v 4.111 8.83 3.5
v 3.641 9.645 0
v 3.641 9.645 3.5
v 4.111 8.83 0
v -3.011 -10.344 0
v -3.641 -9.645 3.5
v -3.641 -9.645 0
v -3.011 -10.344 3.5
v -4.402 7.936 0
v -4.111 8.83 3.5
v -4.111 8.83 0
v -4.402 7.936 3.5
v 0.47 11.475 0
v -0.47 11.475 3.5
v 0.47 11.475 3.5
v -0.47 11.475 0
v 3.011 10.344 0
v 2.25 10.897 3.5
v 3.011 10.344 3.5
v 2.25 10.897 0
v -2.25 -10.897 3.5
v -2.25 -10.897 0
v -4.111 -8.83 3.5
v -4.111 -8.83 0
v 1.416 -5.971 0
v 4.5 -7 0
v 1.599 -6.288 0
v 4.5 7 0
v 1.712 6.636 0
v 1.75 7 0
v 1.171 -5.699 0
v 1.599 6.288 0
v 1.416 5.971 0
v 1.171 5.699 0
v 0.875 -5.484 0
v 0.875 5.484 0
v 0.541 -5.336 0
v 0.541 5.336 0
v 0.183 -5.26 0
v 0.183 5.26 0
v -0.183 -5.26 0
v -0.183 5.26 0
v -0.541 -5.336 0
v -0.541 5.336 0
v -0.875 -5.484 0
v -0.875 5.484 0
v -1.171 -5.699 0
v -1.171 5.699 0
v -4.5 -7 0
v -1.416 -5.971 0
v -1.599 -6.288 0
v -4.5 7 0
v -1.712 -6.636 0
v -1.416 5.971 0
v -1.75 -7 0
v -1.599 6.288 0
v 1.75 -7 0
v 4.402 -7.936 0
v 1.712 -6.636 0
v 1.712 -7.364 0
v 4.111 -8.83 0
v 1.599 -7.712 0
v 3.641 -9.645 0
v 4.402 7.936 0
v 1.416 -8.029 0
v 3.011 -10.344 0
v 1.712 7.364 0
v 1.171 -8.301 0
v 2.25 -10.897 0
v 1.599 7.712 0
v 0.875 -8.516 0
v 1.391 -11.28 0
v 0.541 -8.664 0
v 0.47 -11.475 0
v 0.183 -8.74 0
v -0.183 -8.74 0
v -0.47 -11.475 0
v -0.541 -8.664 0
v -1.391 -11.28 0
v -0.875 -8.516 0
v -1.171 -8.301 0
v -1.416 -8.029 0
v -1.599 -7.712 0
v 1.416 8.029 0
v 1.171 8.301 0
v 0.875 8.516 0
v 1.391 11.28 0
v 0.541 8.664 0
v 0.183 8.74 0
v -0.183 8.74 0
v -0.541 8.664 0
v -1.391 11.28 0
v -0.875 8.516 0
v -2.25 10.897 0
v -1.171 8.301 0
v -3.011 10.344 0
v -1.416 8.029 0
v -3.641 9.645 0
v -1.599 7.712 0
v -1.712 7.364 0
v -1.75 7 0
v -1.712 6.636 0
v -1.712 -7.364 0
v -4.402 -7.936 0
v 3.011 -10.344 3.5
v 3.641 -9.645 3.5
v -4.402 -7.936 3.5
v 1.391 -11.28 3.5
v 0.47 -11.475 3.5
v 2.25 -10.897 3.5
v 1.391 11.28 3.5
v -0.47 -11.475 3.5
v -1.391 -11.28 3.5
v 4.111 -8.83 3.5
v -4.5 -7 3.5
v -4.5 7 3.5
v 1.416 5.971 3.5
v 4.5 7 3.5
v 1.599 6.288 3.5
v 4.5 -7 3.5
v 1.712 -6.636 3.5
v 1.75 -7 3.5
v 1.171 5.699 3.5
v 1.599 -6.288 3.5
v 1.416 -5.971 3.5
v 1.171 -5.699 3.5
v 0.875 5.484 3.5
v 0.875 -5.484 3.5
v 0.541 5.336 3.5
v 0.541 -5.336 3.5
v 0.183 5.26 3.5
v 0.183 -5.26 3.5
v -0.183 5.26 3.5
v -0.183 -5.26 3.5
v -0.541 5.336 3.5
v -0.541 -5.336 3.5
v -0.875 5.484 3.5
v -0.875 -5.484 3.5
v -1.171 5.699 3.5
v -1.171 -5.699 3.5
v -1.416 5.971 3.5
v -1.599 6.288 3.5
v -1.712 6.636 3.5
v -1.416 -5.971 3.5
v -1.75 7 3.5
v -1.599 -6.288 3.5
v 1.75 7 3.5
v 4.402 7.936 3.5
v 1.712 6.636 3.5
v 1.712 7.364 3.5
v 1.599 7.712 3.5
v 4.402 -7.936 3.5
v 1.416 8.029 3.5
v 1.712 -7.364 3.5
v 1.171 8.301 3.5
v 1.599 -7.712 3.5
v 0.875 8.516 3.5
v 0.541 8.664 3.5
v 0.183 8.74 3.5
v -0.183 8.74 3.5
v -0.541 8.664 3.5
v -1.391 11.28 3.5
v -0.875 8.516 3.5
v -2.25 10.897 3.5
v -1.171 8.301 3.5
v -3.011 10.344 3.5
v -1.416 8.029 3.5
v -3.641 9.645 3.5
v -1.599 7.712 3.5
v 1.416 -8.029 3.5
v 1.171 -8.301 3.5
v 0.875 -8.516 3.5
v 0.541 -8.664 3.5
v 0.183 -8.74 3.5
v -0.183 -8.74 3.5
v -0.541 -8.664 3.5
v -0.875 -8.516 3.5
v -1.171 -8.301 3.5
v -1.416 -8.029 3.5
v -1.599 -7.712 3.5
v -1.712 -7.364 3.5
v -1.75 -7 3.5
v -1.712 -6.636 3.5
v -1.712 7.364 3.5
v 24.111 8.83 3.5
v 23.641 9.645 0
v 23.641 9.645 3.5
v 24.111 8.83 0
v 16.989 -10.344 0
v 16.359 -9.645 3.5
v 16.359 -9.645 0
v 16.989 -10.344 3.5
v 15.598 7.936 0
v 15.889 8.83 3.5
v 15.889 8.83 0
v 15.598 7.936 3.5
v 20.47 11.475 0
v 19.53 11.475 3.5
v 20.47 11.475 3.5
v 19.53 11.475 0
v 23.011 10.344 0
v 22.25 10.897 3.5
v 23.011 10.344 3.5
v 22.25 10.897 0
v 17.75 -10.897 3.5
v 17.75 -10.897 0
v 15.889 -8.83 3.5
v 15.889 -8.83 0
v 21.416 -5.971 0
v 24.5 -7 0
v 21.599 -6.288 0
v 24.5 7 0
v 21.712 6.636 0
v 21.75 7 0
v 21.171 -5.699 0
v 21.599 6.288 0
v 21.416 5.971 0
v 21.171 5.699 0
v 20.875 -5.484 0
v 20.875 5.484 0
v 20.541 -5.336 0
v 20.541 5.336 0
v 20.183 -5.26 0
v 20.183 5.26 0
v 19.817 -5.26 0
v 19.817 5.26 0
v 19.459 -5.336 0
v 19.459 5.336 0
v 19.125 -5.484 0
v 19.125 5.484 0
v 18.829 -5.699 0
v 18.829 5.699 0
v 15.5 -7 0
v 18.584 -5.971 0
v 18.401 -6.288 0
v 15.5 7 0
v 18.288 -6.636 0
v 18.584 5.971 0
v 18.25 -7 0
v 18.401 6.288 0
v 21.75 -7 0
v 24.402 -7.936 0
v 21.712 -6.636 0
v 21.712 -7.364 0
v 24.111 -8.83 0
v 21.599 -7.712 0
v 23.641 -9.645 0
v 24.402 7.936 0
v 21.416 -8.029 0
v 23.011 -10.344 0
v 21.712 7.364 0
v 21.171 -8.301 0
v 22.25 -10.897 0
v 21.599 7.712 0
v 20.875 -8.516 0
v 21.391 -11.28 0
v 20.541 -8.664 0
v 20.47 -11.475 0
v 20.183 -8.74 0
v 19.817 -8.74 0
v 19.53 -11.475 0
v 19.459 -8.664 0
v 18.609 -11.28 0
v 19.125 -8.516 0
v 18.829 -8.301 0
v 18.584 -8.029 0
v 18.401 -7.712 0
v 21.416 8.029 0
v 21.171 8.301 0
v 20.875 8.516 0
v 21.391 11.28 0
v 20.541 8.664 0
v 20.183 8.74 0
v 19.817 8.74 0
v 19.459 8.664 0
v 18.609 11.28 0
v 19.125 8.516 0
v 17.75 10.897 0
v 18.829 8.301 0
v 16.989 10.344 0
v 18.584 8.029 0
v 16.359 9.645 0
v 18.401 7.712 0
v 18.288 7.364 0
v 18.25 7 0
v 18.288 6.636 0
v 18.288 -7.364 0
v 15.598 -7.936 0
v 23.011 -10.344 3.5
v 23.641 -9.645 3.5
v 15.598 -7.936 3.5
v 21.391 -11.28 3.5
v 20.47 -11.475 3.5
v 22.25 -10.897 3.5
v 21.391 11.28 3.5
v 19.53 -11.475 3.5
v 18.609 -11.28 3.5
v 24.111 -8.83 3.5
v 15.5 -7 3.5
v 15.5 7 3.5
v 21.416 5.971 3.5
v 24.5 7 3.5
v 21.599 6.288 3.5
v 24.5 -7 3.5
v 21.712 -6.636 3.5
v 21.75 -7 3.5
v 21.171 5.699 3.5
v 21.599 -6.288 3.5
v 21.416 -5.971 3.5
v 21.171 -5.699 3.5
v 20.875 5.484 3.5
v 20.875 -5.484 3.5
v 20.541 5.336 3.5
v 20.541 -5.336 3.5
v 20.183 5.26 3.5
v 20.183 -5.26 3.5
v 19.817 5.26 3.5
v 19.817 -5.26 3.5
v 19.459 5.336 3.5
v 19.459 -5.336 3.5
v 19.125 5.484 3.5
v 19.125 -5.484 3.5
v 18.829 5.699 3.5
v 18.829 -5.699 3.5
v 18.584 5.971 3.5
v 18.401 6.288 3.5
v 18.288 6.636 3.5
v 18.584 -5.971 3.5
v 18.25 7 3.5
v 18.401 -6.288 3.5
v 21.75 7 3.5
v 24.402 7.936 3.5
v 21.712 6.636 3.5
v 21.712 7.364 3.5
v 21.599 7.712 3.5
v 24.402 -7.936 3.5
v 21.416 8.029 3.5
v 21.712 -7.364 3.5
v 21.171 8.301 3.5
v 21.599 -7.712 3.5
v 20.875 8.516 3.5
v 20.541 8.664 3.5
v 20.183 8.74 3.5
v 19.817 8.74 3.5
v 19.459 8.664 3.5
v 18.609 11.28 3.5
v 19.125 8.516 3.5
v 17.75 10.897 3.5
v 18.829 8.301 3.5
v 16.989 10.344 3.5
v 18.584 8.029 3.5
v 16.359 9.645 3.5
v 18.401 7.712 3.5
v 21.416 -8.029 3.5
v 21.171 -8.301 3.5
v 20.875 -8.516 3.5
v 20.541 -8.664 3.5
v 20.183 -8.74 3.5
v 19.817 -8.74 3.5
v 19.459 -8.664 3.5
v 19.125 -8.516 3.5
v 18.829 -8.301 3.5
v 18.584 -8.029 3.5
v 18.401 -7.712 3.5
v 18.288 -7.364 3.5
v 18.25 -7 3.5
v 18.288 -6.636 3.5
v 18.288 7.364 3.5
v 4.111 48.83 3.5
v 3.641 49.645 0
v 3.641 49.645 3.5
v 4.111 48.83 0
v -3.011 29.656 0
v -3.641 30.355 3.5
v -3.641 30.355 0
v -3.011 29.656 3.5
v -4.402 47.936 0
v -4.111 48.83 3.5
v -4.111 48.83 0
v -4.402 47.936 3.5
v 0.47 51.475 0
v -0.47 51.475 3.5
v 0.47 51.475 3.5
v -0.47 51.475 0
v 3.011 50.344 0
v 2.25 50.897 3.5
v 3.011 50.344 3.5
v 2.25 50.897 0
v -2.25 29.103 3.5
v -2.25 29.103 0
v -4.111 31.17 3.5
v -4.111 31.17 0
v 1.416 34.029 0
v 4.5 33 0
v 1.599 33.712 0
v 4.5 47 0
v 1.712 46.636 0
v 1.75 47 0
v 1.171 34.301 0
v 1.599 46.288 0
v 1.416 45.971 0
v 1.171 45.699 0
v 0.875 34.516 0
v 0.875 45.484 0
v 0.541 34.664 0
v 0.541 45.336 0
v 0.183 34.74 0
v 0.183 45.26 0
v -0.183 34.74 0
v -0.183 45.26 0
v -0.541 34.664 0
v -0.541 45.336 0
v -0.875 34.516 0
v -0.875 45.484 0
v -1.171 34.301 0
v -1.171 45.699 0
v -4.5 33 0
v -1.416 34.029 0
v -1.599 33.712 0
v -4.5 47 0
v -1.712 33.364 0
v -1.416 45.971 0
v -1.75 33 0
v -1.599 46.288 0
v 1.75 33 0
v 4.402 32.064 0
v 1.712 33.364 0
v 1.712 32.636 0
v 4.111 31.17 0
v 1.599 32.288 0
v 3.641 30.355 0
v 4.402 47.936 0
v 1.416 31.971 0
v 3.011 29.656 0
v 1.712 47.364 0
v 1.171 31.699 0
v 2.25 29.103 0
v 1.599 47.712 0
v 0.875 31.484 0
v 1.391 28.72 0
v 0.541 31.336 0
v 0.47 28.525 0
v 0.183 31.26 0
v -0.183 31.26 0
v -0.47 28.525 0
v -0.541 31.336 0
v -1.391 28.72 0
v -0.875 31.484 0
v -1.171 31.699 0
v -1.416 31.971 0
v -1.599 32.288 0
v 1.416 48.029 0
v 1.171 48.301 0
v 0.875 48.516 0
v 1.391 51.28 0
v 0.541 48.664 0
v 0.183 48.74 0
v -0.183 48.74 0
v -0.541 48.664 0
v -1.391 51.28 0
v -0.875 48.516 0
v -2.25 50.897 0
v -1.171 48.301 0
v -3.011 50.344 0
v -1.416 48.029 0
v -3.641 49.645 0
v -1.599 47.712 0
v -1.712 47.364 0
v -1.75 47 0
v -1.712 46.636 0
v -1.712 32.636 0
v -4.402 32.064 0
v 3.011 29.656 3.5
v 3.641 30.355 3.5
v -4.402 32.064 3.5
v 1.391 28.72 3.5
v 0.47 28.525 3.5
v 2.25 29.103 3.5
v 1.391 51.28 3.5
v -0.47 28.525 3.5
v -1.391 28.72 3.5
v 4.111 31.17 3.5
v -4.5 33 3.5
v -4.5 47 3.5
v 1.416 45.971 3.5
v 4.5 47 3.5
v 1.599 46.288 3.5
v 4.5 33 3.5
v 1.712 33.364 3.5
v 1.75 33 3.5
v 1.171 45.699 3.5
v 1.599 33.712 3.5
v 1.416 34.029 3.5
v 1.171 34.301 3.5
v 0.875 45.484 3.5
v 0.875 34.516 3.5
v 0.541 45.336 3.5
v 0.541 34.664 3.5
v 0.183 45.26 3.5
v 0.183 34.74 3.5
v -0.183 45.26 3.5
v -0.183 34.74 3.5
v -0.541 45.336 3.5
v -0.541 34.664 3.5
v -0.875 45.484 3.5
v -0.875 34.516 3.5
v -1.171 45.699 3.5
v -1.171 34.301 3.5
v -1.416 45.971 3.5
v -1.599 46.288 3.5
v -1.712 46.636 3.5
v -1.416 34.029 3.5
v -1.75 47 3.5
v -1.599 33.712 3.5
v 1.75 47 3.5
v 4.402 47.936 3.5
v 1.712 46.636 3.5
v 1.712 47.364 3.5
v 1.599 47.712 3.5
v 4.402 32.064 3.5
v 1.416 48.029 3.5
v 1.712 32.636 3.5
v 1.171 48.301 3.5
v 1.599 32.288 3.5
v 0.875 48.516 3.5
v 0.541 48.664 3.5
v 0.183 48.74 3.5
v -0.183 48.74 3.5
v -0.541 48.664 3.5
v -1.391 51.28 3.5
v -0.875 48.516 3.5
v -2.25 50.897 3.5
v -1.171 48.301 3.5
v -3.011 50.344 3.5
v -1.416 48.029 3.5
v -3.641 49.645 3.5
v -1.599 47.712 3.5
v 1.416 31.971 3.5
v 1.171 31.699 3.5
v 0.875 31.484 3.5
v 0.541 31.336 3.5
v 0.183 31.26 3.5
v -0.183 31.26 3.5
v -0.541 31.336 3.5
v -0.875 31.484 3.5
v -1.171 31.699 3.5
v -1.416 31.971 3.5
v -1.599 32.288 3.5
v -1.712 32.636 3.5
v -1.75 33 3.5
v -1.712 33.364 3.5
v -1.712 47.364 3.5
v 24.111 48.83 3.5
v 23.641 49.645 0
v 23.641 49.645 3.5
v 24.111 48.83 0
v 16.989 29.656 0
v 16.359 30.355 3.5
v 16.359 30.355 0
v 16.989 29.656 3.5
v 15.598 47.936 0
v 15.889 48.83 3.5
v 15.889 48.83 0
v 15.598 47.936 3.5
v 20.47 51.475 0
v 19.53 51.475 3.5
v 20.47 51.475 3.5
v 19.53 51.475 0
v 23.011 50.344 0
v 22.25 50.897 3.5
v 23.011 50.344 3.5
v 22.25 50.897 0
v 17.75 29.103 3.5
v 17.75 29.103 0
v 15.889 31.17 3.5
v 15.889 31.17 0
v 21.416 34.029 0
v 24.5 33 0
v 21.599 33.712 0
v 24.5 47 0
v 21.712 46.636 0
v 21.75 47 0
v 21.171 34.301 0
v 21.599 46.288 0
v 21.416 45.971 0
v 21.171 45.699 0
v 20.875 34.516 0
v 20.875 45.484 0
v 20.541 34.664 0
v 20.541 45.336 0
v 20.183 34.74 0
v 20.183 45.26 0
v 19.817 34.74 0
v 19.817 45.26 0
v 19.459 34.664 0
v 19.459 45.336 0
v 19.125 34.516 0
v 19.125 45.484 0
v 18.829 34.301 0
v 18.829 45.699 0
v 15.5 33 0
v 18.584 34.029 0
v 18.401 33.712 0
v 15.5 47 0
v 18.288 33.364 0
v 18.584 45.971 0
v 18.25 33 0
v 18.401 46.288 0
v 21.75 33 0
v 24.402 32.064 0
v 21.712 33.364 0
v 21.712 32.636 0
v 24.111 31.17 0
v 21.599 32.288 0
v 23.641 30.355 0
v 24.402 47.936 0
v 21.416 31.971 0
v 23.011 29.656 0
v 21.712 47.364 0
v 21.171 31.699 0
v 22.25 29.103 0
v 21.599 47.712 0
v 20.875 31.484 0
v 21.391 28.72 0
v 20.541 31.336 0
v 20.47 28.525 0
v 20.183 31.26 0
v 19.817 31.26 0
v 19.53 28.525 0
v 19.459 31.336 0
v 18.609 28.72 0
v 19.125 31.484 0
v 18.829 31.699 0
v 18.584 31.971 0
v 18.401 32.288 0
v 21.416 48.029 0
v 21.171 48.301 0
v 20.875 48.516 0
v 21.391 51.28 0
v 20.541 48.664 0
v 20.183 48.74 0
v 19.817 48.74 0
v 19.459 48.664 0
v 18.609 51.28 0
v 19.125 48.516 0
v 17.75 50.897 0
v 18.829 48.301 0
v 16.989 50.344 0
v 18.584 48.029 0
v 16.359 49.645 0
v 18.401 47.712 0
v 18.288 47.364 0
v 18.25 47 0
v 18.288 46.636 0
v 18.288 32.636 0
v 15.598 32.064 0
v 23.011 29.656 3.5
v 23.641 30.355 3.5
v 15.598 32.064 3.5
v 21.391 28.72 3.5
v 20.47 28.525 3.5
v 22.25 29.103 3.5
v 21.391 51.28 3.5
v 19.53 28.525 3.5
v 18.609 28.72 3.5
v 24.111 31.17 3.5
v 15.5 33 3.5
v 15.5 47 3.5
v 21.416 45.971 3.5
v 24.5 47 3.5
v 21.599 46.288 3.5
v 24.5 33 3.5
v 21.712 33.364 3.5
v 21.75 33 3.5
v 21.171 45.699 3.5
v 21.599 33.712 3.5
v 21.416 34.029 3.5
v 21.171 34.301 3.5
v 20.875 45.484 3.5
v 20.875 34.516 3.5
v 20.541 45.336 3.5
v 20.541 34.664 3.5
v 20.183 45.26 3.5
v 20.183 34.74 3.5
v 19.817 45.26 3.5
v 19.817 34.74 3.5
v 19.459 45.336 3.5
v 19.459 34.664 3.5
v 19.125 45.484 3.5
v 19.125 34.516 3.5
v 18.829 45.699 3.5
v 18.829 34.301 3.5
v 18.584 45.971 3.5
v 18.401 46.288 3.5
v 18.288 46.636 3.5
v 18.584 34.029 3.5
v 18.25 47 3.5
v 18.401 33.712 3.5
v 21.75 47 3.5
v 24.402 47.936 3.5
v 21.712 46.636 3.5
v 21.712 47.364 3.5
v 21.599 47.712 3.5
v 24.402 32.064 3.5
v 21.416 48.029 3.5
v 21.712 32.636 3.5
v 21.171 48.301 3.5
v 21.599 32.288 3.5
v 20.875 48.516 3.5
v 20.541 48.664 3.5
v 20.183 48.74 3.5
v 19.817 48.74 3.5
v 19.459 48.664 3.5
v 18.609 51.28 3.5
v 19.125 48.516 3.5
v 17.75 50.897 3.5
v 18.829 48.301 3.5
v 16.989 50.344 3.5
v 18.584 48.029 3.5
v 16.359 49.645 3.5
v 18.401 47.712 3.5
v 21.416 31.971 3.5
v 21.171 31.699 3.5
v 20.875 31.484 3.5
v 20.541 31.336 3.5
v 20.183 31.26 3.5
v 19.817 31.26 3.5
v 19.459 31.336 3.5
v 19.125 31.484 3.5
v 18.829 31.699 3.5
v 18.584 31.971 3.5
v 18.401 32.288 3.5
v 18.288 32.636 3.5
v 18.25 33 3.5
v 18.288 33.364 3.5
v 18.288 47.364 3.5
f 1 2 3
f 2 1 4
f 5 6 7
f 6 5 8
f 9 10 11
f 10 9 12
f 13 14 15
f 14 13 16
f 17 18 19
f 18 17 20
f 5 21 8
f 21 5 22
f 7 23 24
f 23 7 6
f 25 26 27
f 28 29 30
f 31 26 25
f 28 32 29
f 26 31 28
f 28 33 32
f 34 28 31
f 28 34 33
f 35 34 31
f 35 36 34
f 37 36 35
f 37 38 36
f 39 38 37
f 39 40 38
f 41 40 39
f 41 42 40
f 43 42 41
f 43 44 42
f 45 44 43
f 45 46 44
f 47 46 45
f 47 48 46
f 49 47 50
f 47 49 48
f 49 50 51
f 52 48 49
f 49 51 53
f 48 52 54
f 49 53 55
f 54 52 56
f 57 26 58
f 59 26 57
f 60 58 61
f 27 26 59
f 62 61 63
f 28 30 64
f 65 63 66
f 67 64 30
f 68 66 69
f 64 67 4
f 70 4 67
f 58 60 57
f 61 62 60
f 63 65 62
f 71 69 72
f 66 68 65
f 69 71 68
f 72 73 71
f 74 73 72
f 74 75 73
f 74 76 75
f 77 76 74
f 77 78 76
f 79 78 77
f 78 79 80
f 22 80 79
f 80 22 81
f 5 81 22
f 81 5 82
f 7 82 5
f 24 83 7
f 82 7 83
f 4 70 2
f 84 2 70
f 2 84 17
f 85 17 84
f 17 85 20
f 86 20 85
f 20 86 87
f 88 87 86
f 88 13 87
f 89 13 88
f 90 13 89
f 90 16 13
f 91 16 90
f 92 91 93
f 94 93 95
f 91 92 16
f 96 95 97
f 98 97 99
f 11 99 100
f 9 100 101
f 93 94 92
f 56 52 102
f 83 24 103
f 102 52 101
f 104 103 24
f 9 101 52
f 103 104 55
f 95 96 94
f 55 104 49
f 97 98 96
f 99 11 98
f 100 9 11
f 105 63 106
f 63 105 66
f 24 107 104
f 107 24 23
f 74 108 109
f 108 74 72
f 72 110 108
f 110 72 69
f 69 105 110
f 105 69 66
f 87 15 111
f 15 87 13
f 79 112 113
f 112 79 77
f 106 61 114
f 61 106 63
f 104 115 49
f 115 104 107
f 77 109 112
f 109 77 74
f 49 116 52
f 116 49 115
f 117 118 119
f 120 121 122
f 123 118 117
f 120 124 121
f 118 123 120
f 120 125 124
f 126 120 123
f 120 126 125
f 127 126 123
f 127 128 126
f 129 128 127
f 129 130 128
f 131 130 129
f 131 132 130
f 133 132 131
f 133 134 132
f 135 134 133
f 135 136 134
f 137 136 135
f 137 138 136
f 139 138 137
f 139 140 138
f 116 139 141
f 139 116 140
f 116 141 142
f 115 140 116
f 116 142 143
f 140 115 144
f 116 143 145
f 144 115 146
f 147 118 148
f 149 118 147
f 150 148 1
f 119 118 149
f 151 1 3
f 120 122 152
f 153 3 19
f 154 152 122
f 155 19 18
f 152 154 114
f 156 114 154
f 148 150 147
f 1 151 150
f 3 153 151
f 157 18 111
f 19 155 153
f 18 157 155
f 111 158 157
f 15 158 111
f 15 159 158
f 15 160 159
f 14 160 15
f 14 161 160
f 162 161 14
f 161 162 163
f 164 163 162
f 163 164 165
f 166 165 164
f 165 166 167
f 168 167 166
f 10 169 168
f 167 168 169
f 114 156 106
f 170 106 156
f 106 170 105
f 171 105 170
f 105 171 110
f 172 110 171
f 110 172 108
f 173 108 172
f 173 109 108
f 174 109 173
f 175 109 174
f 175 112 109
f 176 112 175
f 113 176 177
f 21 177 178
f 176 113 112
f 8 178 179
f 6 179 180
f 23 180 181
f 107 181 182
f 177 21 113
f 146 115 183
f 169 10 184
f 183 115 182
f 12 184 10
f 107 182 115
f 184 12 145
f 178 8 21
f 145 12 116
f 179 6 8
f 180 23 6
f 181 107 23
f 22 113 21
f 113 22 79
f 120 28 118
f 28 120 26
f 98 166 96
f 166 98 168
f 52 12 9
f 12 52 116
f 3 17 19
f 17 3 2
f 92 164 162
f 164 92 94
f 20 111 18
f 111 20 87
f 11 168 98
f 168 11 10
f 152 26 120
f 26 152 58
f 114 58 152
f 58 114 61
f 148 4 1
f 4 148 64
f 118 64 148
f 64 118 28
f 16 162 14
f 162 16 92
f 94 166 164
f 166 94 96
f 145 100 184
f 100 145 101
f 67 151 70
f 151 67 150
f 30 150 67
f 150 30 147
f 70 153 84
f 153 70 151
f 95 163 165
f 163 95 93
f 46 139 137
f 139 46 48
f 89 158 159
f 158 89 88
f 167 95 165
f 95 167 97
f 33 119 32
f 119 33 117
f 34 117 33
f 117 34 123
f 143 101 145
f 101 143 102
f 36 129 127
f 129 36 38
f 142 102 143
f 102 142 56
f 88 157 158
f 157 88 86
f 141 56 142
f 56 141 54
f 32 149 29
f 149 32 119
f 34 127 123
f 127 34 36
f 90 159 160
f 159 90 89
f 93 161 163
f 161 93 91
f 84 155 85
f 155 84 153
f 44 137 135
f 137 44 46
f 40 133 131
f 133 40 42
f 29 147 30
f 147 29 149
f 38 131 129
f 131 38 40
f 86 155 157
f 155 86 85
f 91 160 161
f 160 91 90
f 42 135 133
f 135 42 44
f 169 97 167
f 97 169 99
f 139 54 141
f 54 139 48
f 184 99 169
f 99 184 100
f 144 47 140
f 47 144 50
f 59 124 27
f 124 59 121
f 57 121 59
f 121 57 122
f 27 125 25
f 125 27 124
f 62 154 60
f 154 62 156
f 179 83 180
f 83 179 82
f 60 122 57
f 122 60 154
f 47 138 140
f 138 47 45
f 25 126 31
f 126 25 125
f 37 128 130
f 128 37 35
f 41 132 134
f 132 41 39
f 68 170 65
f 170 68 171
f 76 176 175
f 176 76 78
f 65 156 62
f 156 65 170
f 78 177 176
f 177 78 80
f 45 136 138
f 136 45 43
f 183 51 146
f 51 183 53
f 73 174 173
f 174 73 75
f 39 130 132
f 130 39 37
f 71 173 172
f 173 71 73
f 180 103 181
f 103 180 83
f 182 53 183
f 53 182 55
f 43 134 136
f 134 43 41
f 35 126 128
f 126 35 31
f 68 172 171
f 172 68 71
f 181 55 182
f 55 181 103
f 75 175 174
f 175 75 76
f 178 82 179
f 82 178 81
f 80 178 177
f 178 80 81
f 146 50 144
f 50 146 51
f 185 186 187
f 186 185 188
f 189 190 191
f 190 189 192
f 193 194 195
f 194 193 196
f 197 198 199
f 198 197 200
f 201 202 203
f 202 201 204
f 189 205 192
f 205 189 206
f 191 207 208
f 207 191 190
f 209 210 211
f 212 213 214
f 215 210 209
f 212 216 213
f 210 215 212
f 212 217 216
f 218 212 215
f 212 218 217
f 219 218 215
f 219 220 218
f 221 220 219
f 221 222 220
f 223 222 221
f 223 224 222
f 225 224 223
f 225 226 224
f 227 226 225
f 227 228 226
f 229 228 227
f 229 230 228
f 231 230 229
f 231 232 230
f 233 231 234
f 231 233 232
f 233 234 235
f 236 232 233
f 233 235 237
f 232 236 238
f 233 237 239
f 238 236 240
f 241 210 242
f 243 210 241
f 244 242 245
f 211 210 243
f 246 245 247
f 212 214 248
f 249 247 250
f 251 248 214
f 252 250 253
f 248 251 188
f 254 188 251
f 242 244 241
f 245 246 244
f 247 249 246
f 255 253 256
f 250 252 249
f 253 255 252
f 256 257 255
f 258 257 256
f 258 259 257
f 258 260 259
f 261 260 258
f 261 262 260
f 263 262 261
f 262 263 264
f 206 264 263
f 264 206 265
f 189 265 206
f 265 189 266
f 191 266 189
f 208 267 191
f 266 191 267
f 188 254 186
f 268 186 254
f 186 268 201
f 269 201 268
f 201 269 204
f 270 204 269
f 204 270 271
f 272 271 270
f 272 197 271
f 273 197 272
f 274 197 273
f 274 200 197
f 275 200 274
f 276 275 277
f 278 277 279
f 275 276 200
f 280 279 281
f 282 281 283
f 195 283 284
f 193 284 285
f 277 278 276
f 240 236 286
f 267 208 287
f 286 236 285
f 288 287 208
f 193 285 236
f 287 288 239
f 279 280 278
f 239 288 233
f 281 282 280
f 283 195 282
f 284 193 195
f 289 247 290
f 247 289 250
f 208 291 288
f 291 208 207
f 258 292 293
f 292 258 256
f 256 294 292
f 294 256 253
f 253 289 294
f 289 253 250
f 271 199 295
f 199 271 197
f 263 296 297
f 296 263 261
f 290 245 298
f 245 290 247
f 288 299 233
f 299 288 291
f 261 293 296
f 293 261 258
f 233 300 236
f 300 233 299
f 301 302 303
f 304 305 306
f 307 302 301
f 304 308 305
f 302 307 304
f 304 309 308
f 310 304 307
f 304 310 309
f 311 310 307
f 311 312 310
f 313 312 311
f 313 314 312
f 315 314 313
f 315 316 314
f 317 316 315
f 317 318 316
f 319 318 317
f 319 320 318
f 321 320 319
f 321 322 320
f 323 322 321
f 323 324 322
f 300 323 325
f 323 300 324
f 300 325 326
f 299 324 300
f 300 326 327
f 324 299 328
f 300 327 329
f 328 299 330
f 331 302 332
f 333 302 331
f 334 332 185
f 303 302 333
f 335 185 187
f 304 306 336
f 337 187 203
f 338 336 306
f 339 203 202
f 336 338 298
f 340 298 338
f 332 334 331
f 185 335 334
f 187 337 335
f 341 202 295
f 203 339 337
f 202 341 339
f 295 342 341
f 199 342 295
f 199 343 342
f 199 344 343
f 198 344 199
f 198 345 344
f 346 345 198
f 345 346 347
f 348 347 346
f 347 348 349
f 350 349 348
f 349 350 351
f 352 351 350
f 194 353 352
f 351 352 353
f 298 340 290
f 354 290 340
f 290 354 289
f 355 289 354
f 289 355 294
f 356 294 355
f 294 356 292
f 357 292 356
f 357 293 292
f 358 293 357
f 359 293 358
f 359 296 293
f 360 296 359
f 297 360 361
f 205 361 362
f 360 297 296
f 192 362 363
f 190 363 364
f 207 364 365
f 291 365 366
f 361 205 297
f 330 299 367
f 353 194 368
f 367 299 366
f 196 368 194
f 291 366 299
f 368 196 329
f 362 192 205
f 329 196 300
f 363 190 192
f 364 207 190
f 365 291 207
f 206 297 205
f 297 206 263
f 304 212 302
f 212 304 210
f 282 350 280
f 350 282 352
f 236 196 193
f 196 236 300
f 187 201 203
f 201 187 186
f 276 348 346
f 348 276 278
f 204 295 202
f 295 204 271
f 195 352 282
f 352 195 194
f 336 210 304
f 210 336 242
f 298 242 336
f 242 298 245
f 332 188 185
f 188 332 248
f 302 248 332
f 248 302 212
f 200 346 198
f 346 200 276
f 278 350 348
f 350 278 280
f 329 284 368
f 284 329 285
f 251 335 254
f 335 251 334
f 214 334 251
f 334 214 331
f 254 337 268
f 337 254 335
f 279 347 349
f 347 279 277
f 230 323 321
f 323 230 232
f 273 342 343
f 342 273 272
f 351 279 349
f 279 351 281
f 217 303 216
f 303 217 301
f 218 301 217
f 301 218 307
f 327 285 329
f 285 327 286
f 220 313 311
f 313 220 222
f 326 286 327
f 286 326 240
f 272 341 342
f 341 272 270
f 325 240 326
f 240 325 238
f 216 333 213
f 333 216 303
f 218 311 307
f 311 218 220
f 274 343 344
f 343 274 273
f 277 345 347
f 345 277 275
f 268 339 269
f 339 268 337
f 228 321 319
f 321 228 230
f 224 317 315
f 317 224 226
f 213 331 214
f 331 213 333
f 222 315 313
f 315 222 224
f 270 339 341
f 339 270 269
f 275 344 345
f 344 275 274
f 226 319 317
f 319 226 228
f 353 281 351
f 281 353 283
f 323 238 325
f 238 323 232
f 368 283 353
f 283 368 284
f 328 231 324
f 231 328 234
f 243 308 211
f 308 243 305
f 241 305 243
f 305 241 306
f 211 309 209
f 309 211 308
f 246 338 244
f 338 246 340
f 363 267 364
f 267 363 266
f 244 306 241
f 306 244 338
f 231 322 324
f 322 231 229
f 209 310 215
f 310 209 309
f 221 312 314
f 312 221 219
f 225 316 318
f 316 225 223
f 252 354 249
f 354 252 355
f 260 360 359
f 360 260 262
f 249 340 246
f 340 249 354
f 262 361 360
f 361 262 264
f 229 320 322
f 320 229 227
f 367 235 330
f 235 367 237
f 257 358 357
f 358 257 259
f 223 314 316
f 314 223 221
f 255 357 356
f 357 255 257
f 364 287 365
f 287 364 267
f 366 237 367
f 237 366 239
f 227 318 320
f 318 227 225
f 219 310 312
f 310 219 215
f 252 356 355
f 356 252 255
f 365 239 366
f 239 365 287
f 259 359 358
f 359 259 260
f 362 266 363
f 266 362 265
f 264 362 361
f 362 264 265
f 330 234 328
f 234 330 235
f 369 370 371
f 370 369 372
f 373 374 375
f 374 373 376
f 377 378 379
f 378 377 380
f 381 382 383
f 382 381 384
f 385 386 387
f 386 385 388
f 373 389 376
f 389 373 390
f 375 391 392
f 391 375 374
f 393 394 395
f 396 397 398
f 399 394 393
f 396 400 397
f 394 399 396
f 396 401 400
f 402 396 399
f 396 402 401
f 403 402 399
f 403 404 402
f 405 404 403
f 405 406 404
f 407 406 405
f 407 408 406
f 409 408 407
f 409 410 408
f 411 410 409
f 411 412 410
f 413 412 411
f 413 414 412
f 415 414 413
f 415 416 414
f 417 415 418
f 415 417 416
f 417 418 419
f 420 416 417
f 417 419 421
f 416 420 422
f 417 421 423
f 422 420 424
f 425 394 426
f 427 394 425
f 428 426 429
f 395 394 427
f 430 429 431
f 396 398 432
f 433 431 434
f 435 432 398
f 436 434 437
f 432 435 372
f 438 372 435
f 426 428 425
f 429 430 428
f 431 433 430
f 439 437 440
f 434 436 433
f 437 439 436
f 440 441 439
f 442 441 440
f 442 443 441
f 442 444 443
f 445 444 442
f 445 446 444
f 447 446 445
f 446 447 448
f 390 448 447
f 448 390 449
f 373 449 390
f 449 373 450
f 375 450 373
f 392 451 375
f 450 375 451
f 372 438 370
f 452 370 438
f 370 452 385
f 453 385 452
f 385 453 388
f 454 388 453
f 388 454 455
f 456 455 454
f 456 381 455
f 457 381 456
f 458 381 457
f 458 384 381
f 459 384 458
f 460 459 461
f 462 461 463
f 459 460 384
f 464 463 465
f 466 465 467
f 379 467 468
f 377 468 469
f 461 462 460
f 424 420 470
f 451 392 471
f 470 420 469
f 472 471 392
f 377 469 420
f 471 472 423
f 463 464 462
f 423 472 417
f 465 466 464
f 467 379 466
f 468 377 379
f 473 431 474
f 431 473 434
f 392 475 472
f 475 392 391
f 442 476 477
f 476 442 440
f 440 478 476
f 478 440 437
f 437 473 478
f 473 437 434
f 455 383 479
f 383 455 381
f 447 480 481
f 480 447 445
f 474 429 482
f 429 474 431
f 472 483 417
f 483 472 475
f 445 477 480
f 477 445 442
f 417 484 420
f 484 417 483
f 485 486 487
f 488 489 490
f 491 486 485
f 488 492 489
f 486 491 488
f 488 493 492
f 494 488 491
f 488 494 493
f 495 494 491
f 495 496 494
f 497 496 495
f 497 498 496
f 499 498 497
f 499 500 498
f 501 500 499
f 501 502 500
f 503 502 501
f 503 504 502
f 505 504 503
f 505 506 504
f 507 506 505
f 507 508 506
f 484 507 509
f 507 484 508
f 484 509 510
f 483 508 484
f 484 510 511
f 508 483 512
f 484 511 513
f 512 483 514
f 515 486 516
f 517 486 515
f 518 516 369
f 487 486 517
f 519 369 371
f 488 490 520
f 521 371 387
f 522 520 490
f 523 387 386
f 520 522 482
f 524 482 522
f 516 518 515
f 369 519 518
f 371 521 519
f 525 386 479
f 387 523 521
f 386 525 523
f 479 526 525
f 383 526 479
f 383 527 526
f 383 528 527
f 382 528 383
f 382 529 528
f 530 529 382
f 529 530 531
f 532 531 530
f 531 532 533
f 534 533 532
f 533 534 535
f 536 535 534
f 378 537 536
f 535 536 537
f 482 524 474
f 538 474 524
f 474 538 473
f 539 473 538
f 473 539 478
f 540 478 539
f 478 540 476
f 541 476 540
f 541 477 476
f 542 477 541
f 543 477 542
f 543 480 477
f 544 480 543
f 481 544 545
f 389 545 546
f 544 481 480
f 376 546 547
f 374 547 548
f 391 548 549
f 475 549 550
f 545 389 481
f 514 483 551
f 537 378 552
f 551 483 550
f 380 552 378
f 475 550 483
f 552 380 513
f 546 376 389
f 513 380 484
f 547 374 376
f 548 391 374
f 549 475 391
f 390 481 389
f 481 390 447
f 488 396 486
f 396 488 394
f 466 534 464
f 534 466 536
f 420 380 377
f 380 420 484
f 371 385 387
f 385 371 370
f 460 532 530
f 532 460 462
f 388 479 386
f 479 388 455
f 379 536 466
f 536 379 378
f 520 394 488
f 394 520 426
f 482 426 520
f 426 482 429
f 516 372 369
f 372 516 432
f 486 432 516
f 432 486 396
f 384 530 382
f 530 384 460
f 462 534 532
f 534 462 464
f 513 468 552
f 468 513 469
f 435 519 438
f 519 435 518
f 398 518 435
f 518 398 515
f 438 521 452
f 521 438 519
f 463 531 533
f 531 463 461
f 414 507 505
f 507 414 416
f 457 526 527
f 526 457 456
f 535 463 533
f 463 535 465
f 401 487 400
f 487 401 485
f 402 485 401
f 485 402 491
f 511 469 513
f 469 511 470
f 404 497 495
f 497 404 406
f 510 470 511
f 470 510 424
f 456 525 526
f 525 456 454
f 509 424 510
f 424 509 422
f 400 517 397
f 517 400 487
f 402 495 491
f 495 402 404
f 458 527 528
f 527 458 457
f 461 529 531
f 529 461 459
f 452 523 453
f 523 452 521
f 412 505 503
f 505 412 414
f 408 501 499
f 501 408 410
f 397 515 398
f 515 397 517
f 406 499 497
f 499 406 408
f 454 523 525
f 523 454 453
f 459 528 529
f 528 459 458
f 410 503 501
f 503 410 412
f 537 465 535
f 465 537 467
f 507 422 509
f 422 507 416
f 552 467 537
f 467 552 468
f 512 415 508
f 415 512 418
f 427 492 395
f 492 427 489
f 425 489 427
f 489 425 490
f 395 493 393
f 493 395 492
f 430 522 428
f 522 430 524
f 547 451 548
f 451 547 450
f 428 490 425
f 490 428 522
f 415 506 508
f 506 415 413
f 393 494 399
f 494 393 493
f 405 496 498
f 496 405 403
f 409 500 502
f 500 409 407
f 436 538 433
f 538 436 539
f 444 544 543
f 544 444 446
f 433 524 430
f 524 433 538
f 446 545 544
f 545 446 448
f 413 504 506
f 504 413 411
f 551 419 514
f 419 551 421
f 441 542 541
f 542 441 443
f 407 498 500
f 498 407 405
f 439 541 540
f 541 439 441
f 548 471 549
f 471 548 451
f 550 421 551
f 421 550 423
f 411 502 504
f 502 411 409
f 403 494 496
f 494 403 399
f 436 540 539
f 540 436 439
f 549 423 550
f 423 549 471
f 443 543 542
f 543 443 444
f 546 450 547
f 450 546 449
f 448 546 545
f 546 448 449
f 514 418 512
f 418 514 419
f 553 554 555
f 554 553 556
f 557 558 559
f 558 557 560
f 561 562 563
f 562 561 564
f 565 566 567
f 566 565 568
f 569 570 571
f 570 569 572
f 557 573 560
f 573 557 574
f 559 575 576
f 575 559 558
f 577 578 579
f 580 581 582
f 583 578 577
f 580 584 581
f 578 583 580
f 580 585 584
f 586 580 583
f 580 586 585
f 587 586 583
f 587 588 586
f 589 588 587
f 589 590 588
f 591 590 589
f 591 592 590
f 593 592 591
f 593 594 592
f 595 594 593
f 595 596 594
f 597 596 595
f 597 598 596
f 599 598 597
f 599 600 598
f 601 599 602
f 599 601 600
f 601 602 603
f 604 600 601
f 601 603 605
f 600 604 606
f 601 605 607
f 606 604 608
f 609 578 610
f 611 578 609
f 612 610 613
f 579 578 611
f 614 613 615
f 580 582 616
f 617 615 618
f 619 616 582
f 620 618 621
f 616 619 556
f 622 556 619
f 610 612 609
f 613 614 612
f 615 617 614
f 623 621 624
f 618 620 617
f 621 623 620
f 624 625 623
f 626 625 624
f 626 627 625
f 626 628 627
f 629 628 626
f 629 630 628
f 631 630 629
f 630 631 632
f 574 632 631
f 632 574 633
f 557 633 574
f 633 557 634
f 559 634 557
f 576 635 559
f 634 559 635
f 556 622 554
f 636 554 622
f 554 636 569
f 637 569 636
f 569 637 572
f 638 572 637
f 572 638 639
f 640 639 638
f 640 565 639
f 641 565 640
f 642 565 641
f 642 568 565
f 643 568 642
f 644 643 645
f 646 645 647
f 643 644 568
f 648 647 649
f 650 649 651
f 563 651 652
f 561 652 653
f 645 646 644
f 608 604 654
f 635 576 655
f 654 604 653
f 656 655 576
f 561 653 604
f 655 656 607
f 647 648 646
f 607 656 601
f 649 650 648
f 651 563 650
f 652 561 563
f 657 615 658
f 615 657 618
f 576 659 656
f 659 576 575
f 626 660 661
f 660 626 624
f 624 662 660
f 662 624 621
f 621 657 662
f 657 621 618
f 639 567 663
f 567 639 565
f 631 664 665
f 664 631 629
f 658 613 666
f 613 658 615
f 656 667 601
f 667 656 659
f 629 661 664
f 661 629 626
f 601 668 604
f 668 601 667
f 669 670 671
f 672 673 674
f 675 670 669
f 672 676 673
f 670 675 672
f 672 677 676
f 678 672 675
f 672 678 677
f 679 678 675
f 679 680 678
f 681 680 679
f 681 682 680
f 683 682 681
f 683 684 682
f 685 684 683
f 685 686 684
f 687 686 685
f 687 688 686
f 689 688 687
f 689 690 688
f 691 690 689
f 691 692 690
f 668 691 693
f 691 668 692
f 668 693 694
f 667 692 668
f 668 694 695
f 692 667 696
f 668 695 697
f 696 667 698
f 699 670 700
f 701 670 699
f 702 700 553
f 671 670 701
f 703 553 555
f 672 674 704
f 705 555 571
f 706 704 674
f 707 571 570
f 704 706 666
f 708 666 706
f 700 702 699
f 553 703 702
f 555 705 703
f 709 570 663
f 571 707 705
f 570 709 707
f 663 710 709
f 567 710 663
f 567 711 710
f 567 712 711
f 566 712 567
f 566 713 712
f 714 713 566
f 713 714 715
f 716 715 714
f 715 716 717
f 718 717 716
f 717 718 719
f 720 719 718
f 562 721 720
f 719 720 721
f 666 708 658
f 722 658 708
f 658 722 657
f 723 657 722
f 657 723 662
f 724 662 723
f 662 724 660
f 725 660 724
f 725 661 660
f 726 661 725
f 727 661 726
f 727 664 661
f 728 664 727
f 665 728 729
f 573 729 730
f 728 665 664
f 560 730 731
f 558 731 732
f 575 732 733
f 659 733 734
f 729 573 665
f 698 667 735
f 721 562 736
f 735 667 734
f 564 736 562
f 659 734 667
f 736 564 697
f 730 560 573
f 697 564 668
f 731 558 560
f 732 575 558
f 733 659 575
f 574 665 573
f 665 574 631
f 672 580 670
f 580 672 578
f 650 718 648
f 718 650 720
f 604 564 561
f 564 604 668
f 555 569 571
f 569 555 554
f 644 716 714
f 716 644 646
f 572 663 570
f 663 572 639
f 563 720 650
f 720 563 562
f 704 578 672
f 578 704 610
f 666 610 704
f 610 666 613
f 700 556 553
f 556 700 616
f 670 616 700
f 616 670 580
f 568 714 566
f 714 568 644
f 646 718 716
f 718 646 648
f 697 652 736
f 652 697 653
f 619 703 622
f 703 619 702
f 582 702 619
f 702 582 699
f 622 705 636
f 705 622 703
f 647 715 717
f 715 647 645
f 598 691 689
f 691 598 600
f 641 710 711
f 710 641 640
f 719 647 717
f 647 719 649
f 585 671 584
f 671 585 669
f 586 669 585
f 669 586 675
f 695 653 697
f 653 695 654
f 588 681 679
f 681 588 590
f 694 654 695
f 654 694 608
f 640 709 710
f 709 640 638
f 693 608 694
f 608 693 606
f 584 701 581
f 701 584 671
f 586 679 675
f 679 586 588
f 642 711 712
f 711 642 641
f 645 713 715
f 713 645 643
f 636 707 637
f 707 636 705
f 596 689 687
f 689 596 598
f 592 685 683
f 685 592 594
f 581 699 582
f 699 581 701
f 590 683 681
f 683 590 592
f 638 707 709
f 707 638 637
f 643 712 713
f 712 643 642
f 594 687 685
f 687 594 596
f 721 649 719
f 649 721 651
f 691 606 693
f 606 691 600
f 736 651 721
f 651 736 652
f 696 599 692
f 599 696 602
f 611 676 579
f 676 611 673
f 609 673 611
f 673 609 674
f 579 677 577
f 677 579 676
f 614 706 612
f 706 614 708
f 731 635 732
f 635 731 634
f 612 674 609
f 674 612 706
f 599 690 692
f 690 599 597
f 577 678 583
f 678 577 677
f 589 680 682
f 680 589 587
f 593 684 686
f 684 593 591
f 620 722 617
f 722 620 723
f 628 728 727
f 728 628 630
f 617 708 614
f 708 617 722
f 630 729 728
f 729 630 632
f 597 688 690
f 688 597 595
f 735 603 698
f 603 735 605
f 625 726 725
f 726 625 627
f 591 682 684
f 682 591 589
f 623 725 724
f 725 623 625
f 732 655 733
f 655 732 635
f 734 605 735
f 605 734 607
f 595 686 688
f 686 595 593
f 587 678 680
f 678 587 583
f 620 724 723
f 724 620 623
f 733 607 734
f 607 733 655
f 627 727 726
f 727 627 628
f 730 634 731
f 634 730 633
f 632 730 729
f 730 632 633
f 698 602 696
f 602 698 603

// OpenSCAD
// EMAX nighthawk accessories  - a OpenSCAD 
// Copyright (C) 2016  Gerard Valade

// This program is free software: you can redistribute it and/or modify
// it under the terms of the GNU General Public License as published by
// the Free Software Foundation, either version 3 of the License, or
// (at your option) any later version.

// This program is distributed in the hope that it will be useful,
// but WITHOUT ANY WARRANTY; without even the implied warranty of
// MERCHANTABILITY or FITNESS FOR A PARTICULAR PURPOSE.  See the
// GNU General Public License for more details.

// You should have received a copy of the GNU General Public License
// along with this program.  If not, see <http://www.gnu.org/licenses/>.

$fn=30;

module spacer(heigth)
{
	width = 14;
	dia = 9;
	hole = 3.5;
	color("red") difference() {	
		hull()
		{
			translate([0, width/2, 0])  cylinder(d=dia, h=heigth, center=false);
			translate([0, -width/2, 0])  cylinder(d=dia, h=heigth, center=false);
			
		}
		translate([0, width/2, -0.1])  cylinder(d=hole, h=heigth+1, center=false);
		translate([0, -width/2, -0.1])  cylinder(d=hole, h=heigth+1, center=false);
	}
}


translate([0, 0, 0]) rotate([0, 0, 0]) spacer(3.5);
translate([20, 0, 0]) rotate([0, 0, 0]) spacer(3.5);
translate([0, 40, 0]) rotate([0, 0, 0]) spacer(3.5);
translate([20, 40, 0]) rotate([0, 0, 0]) spacer(3.5);


//import("Cleanhawk_Spacer.STL");
